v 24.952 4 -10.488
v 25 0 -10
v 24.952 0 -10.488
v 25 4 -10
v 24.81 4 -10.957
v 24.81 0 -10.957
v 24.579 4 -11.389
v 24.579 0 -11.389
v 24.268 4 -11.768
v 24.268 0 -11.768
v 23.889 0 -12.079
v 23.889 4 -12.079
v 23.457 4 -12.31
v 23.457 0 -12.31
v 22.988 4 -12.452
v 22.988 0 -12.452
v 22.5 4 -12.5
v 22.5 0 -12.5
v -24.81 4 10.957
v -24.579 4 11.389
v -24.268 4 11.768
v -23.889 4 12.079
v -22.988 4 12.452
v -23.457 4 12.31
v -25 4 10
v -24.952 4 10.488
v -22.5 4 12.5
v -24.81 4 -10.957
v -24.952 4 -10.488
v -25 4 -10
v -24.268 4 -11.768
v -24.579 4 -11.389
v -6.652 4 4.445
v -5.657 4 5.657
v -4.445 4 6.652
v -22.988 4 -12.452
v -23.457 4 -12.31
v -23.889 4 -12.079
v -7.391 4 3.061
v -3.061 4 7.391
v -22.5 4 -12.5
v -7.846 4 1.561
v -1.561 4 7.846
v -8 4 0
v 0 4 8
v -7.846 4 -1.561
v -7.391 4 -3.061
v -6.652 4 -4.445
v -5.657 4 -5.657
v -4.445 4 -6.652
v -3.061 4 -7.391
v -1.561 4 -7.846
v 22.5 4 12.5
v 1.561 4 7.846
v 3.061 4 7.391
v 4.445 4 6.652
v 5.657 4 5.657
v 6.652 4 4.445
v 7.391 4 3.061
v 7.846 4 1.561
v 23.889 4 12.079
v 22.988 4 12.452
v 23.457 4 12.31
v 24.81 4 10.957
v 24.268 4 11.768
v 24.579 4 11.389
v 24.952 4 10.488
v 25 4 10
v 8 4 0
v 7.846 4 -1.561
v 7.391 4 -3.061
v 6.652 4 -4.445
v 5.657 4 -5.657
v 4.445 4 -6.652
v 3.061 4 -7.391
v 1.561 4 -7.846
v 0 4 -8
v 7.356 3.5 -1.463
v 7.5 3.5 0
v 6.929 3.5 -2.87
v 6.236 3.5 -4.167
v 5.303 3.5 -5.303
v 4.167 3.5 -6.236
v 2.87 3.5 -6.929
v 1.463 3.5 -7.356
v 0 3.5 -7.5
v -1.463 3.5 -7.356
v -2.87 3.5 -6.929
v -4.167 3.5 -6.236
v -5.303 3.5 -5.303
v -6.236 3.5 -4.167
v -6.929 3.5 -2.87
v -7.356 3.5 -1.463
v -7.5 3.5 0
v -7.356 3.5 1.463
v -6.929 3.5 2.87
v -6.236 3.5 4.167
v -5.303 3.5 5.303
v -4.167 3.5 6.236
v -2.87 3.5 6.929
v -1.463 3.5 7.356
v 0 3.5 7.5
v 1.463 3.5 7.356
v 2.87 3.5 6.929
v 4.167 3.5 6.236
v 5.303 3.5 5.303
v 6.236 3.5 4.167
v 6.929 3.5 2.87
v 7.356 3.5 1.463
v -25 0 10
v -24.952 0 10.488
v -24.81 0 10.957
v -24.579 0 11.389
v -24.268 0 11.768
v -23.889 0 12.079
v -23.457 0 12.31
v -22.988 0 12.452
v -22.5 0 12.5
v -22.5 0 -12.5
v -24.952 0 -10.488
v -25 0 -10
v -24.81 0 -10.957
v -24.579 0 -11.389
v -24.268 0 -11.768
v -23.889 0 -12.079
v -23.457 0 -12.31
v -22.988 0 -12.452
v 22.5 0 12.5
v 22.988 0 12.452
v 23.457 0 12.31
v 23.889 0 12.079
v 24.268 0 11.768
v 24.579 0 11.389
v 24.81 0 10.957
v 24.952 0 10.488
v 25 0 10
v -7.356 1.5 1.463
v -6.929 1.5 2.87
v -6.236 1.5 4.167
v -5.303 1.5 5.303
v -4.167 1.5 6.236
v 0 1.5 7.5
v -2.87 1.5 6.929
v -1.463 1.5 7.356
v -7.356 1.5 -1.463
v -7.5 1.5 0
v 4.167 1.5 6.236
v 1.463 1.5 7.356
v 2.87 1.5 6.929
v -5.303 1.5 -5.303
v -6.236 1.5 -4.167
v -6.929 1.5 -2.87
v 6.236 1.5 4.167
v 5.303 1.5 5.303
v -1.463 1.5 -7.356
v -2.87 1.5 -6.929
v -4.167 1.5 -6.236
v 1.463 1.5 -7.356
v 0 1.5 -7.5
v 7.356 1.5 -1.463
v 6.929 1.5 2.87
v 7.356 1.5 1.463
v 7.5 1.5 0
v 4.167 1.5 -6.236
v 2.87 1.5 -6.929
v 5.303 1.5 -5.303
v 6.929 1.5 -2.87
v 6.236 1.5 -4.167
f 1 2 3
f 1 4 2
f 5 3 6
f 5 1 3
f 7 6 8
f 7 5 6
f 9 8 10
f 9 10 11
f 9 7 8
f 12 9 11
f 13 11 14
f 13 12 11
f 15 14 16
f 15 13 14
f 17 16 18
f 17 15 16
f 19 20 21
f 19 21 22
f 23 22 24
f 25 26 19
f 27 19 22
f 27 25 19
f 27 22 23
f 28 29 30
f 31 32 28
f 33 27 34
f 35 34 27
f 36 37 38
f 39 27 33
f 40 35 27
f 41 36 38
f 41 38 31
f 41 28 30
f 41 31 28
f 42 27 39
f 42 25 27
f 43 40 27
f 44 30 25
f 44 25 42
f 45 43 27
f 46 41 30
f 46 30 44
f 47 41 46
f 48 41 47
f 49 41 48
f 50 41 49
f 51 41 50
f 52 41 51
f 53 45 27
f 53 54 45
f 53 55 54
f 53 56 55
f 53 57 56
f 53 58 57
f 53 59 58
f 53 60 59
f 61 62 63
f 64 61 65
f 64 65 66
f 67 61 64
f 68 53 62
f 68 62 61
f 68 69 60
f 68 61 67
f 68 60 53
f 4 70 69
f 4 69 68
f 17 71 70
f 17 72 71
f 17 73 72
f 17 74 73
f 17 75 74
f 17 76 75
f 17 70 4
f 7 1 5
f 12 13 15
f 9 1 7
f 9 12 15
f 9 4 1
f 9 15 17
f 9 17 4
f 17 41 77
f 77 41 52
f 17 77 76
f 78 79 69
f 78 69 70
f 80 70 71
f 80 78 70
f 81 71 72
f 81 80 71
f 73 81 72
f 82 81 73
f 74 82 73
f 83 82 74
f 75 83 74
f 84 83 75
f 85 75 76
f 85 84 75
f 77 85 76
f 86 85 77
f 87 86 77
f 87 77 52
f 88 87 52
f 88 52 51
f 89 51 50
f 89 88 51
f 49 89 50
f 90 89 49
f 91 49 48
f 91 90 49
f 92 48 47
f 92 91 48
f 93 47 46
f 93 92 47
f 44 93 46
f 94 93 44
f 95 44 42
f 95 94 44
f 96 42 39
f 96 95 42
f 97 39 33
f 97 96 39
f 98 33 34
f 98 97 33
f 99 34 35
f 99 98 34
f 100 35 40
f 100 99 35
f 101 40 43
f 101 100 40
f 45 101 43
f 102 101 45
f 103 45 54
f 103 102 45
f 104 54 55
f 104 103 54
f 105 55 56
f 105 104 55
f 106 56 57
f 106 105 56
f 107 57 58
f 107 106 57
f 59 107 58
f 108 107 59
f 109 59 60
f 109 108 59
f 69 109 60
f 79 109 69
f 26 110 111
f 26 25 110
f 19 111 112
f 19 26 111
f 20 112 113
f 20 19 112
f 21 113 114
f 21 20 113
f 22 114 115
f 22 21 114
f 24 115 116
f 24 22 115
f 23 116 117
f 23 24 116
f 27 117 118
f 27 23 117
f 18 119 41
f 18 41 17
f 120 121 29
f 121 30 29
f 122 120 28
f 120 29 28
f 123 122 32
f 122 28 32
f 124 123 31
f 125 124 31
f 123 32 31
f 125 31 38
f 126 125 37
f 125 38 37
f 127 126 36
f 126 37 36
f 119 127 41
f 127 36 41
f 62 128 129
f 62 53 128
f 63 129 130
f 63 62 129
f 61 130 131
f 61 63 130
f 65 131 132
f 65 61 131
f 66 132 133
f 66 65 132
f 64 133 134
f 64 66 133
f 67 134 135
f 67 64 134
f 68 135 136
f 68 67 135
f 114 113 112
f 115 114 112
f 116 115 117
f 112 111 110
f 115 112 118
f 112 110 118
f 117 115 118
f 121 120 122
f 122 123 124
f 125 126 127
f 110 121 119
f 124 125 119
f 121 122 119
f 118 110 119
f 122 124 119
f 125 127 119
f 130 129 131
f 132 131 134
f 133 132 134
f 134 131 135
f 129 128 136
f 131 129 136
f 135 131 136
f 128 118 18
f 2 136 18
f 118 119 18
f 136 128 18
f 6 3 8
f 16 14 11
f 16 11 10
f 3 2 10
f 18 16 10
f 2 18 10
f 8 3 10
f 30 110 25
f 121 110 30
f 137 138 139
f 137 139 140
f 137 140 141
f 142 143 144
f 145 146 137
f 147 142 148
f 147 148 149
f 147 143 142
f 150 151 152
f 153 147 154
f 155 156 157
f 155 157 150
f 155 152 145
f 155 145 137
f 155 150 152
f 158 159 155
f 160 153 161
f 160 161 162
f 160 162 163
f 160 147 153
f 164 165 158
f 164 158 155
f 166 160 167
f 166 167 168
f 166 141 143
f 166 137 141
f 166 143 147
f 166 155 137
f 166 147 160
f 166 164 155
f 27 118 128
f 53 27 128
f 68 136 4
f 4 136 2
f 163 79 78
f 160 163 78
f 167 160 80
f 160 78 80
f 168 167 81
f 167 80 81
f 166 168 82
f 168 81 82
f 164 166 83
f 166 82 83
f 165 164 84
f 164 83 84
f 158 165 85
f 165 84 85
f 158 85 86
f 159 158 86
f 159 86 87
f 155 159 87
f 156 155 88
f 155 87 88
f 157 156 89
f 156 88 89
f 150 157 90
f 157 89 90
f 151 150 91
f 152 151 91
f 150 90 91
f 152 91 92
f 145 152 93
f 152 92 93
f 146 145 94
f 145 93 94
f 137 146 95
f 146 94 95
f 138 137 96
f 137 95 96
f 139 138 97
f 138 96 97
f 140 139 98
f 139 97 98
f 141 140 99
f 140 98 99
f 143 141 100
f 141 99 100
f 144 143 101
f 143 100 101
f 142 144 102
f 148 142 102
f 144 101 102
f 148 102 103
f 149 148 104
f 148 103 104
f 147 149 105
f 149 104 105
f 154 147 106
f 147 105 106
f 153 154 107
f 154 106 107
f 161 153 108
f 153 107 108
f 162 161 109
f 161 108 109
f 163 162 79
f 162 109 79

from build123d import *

# Parameters (mm, degrees)
SKETCH2_W           = 50
SKETCH2_H           = 25
BOSS_EXTRUDE1_DEPTH = 4
FILLET1_R           = 2.5
SKETCH3_R           = 7.5
CUT_EXTRUDE1_DEPTH  = 2.5
CHAMFER1_SIZE       = 0.5


with BuildPart() as part:
    # Sketch2 → Boss-Extrude1 (new body)
    with BuildSketch(Plane(origin=(0, 0, 0), x_dir=(1, 0, 0), z_dir=(0, 1, 0))):
        Rectangle(SKETCH2_W, SKETCH2_H)
    extrude(amount=BOSS_EXTRUDE1_DEPTH)

    # Fillet1
    fillet1_edges = [part.edges().sort_by_distance(p)[0] for p in [
        (25, 2, 12.5),
        (-25, 2, 12.5),
        (-25, 2, -12.5),
        (25, 2, -12.5),
    ]]
    fillet(fillet1_edges, radius=FILLET1_R)

    # Sketch3 → Cut-Extrude1 (cut)
    with BuildSketch(Plane(origin=(0, 4, 0), x_dir=(1, 0, 0), z_dir=(0, 1, 0))):
        Circle(SKETCH3_R)
    extrude(amount=-CUT_EXTRUDE1_DEPTH, mode=Mode.SUBTRACT)

    # Chamfer1
    chamfer1_edges = [part.edges().sort_by_distance(p)[0] for p in [
        (-7.5, 4, 0),
    ]]
    chamfer(chamfer1_edges, length=CHAMFER1_SIZE)


solid = part.part
